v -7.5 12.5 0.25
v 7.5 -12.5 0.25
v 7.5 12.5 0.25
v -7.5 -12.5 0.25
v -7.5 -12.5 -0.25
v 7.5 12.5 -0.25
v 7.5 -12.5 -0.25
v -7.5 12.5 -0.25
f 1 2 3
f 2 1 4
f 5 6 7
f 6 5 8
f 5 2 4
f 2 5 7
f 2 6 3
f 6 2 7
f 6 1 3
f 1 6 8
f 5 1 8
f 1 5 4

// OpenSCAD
// file: BOSL2/std.scad
// Minimal BOSL2 compatibility shim for bundled gallery models.
// It implements only the helpers used by the imported OpenSCAD projects.

CENTER = [0, 0, 0];
BOTTOM = [0, 0, -1];
TOP = [0, 0, 1];
LEFT = [-1, 0, 0];
RIGHT = [1, 0, 0];
FRONT = [0, -1, 0];
BACK = [0, 1, 0];

module up(z=0) {
    translate([0, 0, z]) children();
}

module down(z=0) {
    translate([0, 0, -z]) children();
}

module attach(anchor=CENTER) {
    children();
}

module cuboid(size=[1, 1, 1], anchor=CENTER) {
    center = anchor == CENTER;
    translate(center ? [0, 0, 0] : [0, 0, size[2] / 2])
        cube(size, center=true);
    children();
}

module xcyl(h=1, r=1, anchor=CENTER) {
    center = anchor == CENTER;
    translate(center ? [0, 0, 0] : [h / 2, 0, 0])
        rotate([0, 90, 0])
            cylinder(h=h, r=r, center=true);
}
// main file
include <BOSL2/std.scad>

cuboid([15,25,0.5], rounding=5, edges=[BACK+RIGHT,BACK+LEFT]);
